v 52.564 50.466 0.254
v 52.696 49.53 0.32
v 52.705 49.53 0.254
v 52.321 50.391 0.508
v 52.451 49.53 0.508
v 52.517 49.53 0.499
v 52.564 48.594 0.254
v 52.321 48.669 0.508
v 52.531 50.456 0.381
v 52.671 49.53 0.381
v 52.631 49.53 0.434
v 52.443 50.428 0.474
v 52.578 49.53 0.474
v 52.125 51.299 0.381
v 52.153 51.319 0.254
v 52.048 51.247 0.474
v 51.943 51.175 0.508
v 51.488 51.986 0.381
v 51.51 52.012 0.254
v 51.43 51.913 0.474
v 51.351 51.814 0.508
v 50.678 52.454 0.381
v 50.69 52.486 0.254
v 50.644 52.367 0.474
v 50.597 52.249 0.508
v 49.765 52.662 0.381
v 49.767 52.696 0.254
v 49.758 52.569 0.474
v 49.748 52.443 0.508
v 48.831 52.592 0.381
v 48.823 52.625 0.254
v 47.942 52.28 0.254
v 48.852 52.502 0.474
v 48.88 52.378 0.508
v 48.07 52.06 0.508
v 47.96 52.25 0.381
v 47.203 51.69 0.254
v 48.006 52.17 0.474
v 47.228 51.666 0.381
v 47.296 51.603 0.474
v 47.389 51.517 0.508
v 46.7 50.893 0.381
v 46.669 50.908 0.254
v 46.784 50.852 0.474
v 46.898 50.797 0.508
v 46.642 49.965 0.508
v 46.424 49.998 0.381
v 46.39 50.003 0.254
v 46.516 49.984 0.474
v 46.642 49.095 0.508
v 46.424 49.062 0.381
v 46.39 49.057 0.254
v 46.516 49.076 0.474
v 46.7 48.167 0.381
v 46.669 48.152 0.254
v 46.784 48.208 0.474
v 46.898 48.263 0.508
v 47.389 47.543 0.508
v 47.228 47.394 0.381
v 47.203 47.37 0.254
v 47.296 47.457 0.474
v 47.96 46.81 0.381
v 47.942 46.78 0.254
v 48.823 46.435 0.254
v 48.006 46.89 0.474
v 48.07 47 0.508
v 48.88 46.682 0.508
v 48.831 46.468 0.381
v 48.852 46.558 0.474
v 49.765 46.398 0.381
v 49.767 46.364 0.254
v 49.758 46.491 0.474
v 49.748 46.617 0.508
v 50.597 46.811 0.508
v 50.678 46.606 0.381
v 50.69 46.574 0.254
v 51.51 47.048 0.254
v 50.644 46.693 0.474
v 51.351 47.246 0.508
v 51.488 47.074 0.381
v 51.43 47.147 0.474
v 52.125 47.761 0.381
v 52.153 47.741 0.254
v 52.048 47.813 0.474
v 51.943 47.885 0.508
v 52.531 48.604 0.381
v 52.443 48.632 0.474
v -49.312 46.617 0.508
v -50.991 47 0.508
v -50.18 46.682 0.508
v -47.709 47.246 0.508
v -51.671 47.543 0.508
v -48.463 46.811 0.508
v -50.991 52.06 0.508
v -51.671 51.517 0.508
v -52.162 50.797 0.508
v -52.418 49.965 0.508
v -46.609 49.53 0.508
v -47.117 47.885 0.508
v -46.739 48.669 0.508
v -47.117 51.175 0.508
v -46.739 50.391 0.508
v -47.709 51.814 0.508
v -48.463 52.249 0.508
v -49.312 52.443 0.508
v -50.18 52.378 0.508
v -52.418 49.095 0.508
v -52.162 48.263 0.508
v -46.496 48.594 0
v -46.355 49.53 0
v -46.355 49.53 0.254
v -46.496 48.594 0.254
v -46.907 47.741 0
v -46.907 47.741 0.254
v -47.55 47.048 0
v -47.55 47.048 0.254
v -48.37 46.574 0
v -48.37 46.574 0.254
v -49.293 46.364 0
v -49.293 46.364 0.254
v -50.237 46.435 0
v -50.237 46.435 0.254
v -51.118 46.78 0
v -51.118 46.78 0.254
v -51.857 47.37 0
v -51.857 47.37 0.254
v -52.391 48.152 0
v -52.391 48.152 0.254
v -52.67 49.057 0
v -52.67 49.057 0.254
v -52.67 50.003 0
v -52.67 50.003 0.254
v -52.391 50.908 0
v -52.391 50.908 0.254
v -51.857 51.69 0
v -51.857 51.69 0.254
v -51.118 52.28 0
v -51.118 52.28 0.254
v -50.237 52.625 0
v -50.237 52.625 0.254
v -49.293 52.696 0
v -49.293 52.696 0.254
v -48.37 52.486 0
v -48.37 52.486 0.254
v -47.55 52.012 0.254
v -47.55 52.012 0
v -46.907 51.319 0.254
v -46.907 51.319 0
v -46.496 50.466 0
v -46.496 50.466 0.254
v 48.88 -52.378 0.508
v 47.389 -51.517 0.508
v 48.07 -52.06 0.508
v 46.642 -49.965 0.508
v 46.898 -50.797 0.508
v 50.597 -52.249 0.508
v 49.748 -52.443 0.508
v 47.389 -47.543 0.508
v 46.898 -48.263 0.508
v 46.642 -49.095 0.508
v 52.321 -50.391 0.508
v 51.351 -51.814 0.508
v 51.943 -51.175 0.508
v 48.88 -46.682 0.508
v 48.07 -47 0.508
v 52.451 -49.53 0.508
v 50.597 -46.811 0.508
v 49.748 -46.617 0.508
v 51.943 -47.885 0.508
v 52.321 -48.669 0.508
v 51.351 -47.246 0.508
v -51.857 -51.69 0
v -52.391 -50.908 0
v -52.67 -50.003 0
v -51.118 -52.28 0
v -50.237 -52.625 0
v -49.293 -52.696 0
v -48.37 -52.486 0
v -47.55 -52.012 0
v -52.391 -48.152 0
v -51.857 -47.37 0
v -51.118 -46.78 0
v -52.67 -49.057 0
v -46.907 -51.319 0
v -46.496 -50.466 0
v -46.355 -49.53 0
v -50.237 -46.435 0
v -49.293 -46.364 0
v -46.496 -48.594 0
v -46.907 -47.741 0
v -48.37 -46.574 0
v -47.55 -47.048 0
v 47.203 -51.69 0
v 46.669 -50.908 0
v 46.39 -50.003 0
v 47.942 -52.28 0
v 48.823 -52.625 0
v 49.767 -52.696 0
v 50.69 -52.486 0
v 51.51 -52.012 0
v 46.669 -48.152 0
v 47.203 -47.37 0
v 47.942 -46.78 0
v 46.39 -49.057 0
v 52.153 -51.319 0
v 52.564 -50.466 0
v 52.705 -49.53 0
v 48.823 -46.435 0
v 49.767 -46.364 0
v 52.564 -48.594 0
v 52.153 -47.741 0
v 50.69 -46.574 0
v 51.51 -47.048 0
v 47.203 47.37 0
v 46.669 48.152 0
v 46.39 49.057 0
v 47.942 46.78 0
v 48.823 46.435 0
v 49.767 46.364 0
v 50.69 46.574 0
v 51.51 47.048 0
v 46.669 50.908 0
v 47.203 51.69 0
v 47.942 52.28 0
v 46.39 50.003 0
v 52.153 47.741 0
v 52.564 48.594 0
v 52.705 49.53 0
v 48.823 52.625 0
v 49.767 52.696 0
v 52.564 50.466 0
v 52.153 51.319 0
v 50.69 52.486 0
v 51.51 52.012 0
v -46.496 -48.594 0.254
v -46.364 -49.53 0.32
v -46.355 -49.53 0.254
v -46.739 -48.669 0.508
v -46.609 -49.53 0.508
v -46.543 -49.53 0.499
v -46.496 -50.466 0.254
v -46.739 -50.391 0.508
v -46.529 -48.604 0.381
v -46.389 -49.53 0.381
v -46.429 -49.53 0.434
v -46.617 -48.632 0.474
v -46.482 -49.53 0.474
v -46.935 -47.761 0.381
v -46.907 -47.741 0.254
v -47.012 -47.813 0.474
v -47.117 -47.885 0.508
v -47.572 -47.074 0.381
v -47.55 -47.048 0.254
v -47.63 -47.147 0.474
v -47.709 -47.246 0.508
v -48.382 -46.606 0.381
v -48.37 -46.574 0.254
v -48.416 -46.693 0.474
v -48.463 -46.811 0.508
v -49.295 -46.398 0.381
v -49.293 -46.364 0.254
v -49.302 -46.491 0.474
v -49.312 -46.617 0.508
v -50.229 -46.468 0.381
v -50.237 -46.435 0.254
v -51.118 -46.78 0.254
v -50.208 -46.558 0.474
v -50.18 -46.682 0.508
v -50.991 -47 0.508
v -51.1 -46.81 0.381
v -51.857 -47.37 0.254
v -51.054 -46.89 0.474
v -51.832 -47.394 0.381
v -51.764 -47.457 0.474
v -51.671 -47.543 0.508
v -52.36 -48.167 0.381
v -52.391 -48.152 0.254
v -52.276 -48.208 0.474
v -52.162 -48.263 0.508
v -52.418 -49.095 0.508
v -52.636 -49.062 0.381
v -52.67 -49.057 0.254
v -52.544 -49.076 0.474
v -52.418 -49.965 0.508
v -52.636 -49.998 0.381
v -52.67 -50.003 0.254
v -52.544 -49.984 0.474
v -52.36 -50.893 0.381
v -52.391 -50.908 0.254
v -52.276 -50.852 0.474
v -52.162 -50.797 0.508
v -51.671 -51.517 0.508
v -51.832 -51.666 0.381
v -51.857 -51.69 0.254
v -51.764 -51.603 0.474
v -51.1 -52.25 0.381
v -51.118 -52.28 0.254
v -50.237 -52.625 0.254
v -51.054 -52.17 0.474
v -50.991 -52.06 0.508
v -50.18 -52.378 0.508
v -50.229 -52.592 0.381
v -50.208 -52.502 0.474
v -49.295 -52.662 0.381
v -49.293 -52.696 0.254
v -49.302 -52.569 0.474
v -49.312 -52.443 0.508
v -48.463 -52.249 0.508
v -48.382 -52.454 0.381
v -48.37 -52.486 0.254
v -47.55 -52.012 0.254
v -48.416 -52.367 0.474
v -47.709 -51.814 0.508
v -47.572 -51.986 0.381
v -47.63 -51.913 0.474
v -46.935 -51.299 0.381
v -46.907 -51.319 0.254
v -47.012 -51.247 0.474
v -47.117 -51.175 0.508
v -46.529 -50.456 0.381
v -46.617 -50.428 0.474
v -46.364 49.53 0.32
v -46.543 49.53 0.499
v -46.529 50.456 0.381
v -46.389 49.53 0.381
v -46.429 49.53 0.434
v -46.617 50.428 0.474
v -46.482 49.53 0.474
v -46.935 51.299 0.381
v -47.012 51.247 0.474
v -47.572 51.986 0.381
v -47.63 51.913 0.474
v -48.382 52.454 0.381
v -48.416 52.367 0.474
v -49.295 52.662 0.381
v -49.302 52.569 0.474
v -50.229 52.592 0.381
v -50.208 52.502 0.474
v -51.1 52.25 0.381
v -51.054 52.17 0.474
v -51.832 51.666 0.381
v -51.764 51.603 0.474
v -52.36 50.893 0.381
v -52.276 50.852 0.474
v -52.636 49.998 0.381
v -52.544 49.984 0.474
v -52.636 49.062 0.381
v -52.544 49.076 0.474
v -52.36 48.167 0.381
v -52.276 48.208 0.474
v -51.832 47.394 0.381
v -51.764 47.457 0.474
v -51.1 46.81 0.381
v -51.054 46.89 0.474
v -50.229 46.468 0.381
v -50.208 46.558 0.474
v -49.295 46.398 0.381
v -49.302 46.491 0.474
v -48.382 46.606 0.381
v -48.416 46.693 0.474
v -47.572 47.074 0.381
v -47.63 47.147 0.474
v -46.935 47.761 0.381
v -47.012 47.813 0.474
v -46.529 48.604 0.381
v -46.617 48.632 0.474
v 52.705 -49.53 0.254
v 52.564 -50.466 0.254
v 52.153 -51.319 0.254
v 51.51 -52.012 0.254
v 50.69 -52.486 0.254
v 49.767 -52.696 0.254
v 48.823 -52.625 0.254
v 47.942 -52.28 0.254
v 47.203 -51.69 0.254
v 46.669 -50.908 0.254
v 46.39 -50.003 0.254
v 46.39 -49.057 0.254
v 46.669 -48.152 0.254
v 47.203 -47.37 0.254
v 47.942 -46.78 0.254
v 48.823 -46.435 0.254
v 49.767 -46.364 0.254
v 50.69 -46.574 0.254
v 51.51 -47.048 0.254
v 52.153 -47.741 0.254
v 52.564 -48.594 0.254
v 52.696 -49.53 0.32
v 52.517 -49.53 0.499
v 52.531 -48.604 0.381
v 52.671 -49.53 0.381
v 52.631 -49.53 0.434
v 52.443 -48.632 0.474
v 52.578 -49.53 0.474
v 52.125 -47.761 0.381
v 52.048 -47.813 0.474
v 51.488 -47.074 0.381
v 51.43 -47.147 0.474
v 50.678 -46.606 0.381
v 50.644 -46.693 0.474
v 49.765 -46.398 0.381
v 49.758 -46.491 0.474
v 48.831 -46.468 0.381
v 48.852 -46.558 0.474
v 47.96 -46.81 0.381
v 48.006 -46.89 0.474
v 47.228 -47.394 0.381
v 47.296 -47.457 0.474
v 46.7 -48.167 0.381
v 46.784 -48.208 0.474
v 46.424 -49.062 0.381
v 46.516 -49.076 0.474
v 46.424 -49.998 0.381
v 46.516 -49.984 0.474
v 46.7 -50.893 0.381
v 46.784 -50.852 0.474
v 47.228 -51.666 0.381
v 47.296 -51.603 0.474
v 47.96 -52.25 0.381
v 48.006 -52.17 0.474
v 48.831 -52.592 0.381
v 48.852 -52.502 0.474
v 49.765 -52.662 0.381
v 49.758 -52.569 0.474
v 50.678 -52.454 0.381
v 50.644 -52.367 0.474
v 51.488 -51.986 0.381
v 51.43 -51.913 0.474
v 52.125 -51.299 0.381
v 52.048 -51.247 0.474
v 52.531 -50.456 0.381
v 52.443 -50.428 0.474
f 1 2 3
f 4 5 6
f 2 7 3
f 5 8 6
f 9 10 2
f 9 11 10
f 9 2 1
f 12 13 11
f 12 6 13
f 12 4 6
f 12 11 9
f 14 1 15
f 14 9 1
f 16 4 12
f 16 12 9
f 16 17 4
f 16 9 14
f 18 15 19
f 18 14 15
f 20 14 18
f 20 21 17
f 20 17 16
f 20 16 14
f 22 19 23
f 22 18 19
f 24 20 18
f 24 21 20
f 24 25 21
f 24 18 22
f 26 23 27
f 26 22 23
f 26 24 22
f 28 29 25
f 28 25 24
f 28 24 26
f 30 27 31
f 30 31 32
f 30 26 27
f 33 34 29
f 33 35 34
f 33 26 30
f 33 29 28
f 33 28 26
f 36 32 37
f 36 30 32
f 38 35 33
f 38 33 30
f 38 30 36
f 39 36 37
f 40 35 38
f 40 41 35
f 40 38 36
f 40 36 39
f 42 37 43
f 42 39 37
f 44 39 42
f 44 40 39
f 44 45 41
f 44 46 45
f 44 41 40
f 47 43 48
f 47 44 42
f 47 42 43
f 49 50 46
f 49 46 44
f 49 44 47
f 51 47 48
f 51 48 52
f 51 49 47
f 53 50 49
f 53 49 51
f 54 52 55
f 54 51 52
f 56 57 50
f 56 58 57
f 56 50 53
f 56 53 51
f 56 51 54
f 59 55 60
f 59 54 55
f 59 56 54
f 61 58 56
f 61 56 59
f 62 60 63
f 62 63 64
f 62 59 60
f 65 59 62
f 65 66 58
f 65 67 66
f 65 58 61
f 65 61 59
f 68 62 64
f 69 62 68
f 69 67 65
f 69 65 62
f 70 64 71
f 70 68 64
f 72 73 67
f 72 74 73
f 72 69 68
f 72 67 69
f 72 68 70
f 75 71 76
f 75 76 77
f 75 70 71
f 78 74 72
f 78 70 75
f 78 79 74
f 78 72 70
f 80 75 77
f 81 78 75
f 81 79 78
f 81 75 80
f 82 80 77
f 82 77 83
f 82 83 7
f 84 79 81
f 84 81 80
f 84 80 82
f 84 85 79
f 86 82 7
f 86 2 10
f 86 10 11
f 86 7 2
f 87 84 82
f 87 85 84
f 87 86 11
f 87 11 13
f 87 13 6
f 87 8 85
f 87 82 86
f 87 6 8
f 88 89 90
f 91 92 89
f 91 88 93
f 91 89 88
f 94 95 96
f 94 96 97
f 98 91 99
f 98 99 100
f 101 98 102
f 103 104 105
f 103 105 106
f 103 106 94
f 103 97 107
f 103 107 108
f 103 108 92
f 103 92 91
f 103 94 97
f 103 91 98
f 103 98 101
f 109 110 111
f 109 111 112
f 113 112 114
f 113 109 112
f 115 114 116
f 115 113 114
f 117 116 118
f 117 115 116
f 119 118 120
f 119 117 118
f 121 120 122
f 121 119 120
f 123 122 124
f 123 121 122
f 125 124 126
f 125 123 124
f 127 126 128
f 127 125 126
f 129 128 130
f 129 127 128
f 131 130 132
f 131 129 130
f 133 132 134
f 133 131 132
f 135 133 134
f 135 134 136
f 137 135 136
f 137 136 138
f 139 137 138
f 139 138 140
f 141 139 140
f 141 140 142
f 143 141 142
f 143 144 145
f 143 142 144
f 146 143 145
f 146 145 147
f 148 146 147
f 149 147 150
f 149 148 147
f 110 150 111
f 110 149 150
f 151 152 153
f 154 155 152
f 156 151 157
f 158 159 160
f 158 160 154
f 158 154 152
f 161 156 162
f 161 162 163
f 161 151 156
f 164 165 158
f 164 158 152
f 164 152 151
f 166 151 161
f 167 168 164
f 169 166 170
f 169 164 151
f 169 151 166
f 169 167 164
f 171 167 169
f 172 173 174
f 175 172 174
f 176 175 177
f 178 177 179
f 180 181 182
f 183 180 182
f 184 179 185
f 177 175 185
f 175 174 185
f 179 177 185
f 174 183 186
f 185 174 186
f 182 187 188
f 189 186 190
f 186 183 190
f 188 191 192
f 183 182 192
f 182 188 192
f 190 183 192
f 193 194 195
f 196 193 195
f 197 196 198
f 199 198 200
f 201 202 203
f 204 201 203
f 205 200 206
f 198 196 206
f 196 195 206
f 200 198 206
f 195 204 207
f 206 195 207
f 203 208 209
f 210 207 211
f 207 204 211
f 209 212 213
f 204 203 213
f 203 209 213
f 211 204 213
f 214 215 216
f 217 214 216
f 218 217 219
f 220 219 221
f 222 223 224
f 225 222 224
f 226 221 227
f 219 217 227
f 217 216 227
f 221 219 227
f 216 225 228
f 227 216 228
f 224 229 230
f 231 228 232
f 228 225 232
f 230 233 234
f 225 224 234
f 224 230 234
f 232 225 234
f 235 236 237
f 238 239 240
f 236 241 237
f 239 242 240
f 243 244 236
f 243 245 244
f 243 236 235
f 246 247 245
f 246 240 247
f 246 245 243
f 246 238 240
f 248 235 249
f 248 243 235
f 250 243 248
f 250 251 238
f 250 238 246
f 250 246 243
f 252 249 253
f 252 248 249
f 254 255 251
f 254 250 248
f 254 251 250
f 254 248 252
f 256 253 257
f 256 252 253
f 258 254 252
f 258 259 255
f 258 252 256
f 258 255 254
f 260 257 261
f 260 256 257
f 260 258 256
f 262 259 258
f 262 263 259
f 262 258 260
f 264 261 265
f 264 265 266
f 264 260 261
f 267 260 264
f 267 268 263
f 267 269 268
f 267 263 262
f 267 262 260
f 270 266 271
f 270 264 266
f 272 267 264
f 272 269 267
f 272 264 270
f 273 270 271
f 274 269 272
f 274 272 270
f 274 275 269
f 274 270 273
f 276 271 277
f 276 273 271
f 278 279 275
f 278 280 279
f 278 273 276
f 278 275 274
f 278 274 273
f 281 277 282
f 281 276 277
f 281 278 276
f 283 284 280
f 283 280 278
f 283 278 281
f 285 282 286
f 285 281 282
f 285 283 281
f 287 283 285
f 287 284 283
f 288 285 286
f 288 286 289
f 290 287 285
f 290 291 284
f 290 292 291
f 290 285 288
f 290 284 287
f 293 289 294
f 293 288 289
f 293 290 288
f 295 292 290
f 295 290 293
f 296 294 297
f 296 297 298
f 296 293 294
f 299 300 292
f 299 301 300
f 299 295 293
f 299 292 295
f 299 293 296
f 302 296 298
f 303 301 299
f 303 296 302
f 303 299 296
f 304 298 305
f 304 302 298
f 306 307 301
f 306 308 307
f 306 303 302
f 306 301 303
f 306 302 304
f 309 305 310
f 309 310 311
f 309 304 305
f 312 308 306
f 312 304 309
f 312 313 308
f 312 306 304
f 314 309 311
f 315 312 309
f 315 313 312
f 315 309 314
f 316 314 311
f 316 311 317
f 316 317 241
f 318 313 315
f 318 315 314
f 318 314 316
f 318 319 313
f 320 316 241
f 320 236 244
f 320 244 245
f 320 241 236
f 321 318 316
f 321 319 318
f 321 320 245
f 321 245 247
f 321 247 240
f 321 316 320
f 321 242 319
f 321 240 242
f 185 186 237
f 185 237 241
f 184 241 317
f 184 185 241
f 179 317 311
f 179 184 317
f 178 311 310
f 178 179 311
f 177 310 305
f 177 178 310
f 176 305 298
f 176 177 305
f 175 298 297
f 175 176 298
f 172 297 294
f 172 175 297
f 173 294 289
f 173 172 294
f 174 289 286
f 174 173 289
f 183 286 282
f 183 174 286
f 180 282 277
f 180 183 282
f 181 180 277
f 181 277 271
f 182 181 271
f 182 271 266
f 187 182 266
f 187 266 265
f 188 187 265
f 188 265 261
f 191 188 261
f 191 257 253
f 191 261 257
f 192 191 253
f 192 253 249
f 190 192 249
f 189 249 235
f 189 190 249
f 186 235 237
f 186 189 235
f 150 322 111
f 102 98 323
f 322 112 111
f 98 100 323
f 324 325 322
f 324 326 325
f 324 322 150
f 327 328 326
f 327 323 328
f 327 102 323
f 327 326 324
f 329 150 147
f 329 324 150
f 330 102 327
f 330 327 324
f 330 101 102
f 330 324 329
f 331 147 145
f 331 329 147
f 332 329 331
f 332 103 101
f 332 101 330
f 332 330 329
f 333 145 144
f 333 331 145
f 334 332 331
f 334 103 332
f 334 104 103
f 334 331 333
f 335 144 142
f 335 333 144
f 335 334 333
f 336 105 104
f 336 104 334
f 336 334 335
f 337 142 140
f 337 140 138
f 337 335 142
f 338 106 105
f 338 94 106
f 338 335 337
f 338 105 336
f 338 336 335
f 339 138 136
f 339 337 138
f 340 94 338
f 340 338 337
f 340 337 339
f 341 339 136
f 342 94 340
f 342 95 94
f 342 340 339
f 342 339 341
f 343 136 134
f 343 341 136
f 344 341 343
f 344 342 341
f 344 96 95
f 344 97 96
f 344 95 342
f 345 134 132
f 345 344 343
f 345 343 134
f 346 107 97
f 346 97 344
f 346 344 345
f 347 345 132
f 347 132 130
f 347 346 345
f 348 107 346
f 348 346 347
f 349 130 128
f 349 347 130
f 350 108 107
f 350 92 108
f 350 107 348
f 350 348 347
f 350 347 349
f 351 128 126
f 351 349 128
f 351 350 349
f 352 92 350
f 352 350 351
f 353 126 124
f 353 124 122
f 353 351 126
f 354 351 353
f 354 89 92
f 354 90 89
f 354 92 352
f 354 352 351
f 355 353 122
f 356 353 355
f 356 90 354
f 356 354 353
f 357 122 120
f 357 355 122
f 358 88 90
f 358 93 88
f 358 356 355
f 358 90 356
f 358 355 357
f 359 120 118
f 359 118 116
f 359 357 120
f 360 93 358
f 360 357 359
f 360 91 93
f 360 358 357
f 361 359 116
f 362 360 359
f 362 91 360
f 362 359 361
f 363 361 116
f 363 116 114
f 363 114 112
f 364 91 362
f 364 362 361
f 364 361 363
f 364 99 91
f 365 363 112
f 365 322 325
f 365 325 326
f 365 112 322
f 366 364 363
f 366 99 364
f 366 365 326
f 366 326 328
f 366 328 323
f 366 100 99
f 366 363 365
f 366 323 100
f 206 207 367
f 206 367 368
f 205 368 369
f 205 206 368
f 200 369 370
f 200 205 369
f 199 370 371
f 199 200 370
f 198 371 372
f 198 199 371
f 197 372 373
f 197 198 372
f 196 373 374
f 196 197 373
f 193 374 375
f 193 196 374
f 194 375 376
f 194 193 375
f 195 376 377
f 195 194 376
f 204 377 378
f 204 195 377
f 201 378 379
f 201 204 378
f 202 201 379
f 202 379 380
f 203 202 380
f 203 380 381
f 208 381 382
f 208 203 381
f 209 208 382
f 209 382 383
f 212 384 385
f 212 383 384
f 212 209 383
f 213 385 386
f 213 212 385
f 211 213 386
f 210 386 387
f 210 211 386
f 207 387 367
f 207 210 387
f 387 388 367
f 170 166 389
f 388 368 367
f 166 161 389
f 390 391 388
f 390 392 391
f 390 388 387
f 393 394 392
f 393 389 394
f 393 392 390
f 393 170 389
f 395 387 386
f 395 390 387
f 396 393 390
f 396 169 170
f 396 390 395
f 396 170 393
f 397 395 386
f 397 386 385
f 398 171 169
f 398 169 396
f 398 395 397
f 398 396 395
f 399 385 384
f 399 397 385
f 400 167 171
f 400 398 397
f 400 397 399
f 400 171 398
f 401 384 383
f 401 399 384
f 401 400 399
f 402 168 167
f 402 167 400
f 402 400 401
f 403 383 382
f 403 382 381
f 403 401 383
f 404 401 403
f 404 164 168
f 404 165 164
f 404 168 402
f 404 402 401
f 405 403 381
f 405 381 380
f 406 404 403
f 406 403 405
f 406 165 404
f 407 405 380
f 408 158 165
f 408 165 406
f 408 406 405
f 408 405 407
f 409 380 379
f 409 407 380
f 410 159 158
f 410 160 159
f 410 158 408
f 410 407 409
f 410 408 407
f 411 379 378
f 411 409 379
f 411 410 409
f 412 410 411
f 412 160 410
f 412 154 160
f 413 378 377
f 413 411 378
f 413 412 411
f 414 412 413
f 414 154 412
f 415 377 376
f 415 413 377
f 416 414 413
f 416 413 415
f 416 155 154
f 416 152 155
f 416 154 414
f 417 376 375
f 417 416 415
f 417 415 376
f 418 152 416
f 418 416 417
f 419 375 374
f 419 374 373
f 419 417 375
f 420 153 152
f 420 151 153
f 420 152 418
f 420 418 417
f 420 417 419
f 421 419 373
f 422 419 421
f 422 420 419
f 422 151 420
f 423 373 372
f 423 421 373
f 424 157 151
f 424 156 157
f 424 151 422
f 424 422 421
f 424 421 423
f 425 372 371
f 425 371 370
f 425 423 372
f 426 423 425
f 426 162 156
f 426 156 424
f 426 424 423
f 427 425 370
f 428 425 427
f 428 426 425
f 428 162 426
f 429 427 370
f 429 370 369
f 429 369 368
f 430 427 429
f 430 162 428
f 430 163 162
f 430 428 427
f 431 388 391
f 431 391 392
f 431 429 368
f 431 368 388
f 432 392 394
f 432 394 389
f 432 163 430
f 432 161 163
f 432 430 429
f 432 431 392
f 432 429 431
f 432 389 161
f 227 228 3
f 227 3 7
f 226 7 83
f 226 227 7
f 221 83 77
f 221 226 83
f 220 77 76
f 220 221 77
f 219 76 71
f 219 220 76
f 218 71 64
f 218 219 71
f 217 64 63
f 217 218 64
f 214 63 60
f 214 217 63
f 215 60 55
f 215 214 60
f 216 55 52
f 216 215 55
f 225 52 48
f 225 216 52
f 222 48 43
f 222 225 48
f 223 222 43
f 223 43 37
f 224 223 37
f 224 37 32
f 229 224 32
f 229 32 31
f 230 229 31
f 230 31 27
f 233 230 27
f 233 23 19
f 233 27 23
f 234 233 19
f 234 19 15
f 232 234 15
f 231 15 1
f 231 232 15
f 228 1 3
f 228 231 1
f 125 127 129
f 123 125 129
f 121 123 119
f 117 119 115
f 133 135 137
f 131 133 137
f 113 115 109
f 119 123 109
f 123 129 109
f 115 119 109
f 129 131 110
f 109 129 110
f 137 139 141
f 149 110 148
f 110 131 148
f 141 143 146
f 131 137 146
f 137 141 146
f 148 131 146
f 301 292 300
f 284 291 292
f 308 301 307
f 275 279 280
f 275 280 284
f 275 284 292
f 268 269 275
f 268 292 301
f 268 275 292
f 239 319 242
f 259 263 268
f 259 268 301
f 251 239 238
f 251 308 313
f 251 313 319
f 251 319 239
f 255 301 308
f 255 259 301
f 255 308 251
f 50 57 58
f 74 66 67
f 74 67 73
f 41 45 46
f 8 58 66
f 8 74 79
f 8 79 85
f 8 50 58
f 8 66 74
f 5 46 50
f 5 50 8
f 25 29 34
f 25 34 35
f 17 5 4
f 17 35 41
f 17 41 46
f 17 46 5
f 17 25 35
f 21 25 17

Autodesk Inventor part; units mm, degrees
ref_plane "YZ Plane" through (0, 0, 0) normal (1, 0, 0) x (0, 1, 0)
ref_plane "XZ Plane" through (0, 0, 0) normal (0, 1, 0) x (-1, 0, 0)
ref_plane "XY Plane" through (0, 0, 0) normal (0, 0, 1) x (1, 0, 0)
sketch "Sketch1" plane through (0, 0, 0) normal (0, 0, 1) x (1, 0, 0)
  circle A0 centre (49.53, 49.53) radius 3.175 projected
  circle A1 centre (49.53, -49.53) radius 3.175 projected
  circle A2 centre (-49.53, -49.53) radius 3.175 projected
  circle A3 centre (-49.53, 49.53) radius 3.175 projected
  point P0 (0, 0)
extrude "Extrusion1" add sketch "Sketch1" along normal blind 0.254
sketch "Sketch2" plane through (-49.53, 49.53, 0.254) normal (0, 0, 1) x (1, 0, 0)
  circle A0 centre (0, 0) radius 3.175 projected
  circle A1 centre (99.06, 0) radius 3.175 projected
  circle A2 centre (99.06, -99.06) radius 3.175 projected
  circle A3 centre (0, -99.06) radius 3.175 projected
  point P0 (49.53, -49.53)
extrude "Extrusion2" add sketch "Sketch2" along normal blind 0.254
fillet "Fillet1" radius 0.254 4 edges at (46.355, -49.53, 0.508) (46.355, 49.53, 0.508) (-52.705, 49.53, 0.508) (-52.705, -49.53, 0.508)
properties part number "RubberFeet" material "Rubber"
